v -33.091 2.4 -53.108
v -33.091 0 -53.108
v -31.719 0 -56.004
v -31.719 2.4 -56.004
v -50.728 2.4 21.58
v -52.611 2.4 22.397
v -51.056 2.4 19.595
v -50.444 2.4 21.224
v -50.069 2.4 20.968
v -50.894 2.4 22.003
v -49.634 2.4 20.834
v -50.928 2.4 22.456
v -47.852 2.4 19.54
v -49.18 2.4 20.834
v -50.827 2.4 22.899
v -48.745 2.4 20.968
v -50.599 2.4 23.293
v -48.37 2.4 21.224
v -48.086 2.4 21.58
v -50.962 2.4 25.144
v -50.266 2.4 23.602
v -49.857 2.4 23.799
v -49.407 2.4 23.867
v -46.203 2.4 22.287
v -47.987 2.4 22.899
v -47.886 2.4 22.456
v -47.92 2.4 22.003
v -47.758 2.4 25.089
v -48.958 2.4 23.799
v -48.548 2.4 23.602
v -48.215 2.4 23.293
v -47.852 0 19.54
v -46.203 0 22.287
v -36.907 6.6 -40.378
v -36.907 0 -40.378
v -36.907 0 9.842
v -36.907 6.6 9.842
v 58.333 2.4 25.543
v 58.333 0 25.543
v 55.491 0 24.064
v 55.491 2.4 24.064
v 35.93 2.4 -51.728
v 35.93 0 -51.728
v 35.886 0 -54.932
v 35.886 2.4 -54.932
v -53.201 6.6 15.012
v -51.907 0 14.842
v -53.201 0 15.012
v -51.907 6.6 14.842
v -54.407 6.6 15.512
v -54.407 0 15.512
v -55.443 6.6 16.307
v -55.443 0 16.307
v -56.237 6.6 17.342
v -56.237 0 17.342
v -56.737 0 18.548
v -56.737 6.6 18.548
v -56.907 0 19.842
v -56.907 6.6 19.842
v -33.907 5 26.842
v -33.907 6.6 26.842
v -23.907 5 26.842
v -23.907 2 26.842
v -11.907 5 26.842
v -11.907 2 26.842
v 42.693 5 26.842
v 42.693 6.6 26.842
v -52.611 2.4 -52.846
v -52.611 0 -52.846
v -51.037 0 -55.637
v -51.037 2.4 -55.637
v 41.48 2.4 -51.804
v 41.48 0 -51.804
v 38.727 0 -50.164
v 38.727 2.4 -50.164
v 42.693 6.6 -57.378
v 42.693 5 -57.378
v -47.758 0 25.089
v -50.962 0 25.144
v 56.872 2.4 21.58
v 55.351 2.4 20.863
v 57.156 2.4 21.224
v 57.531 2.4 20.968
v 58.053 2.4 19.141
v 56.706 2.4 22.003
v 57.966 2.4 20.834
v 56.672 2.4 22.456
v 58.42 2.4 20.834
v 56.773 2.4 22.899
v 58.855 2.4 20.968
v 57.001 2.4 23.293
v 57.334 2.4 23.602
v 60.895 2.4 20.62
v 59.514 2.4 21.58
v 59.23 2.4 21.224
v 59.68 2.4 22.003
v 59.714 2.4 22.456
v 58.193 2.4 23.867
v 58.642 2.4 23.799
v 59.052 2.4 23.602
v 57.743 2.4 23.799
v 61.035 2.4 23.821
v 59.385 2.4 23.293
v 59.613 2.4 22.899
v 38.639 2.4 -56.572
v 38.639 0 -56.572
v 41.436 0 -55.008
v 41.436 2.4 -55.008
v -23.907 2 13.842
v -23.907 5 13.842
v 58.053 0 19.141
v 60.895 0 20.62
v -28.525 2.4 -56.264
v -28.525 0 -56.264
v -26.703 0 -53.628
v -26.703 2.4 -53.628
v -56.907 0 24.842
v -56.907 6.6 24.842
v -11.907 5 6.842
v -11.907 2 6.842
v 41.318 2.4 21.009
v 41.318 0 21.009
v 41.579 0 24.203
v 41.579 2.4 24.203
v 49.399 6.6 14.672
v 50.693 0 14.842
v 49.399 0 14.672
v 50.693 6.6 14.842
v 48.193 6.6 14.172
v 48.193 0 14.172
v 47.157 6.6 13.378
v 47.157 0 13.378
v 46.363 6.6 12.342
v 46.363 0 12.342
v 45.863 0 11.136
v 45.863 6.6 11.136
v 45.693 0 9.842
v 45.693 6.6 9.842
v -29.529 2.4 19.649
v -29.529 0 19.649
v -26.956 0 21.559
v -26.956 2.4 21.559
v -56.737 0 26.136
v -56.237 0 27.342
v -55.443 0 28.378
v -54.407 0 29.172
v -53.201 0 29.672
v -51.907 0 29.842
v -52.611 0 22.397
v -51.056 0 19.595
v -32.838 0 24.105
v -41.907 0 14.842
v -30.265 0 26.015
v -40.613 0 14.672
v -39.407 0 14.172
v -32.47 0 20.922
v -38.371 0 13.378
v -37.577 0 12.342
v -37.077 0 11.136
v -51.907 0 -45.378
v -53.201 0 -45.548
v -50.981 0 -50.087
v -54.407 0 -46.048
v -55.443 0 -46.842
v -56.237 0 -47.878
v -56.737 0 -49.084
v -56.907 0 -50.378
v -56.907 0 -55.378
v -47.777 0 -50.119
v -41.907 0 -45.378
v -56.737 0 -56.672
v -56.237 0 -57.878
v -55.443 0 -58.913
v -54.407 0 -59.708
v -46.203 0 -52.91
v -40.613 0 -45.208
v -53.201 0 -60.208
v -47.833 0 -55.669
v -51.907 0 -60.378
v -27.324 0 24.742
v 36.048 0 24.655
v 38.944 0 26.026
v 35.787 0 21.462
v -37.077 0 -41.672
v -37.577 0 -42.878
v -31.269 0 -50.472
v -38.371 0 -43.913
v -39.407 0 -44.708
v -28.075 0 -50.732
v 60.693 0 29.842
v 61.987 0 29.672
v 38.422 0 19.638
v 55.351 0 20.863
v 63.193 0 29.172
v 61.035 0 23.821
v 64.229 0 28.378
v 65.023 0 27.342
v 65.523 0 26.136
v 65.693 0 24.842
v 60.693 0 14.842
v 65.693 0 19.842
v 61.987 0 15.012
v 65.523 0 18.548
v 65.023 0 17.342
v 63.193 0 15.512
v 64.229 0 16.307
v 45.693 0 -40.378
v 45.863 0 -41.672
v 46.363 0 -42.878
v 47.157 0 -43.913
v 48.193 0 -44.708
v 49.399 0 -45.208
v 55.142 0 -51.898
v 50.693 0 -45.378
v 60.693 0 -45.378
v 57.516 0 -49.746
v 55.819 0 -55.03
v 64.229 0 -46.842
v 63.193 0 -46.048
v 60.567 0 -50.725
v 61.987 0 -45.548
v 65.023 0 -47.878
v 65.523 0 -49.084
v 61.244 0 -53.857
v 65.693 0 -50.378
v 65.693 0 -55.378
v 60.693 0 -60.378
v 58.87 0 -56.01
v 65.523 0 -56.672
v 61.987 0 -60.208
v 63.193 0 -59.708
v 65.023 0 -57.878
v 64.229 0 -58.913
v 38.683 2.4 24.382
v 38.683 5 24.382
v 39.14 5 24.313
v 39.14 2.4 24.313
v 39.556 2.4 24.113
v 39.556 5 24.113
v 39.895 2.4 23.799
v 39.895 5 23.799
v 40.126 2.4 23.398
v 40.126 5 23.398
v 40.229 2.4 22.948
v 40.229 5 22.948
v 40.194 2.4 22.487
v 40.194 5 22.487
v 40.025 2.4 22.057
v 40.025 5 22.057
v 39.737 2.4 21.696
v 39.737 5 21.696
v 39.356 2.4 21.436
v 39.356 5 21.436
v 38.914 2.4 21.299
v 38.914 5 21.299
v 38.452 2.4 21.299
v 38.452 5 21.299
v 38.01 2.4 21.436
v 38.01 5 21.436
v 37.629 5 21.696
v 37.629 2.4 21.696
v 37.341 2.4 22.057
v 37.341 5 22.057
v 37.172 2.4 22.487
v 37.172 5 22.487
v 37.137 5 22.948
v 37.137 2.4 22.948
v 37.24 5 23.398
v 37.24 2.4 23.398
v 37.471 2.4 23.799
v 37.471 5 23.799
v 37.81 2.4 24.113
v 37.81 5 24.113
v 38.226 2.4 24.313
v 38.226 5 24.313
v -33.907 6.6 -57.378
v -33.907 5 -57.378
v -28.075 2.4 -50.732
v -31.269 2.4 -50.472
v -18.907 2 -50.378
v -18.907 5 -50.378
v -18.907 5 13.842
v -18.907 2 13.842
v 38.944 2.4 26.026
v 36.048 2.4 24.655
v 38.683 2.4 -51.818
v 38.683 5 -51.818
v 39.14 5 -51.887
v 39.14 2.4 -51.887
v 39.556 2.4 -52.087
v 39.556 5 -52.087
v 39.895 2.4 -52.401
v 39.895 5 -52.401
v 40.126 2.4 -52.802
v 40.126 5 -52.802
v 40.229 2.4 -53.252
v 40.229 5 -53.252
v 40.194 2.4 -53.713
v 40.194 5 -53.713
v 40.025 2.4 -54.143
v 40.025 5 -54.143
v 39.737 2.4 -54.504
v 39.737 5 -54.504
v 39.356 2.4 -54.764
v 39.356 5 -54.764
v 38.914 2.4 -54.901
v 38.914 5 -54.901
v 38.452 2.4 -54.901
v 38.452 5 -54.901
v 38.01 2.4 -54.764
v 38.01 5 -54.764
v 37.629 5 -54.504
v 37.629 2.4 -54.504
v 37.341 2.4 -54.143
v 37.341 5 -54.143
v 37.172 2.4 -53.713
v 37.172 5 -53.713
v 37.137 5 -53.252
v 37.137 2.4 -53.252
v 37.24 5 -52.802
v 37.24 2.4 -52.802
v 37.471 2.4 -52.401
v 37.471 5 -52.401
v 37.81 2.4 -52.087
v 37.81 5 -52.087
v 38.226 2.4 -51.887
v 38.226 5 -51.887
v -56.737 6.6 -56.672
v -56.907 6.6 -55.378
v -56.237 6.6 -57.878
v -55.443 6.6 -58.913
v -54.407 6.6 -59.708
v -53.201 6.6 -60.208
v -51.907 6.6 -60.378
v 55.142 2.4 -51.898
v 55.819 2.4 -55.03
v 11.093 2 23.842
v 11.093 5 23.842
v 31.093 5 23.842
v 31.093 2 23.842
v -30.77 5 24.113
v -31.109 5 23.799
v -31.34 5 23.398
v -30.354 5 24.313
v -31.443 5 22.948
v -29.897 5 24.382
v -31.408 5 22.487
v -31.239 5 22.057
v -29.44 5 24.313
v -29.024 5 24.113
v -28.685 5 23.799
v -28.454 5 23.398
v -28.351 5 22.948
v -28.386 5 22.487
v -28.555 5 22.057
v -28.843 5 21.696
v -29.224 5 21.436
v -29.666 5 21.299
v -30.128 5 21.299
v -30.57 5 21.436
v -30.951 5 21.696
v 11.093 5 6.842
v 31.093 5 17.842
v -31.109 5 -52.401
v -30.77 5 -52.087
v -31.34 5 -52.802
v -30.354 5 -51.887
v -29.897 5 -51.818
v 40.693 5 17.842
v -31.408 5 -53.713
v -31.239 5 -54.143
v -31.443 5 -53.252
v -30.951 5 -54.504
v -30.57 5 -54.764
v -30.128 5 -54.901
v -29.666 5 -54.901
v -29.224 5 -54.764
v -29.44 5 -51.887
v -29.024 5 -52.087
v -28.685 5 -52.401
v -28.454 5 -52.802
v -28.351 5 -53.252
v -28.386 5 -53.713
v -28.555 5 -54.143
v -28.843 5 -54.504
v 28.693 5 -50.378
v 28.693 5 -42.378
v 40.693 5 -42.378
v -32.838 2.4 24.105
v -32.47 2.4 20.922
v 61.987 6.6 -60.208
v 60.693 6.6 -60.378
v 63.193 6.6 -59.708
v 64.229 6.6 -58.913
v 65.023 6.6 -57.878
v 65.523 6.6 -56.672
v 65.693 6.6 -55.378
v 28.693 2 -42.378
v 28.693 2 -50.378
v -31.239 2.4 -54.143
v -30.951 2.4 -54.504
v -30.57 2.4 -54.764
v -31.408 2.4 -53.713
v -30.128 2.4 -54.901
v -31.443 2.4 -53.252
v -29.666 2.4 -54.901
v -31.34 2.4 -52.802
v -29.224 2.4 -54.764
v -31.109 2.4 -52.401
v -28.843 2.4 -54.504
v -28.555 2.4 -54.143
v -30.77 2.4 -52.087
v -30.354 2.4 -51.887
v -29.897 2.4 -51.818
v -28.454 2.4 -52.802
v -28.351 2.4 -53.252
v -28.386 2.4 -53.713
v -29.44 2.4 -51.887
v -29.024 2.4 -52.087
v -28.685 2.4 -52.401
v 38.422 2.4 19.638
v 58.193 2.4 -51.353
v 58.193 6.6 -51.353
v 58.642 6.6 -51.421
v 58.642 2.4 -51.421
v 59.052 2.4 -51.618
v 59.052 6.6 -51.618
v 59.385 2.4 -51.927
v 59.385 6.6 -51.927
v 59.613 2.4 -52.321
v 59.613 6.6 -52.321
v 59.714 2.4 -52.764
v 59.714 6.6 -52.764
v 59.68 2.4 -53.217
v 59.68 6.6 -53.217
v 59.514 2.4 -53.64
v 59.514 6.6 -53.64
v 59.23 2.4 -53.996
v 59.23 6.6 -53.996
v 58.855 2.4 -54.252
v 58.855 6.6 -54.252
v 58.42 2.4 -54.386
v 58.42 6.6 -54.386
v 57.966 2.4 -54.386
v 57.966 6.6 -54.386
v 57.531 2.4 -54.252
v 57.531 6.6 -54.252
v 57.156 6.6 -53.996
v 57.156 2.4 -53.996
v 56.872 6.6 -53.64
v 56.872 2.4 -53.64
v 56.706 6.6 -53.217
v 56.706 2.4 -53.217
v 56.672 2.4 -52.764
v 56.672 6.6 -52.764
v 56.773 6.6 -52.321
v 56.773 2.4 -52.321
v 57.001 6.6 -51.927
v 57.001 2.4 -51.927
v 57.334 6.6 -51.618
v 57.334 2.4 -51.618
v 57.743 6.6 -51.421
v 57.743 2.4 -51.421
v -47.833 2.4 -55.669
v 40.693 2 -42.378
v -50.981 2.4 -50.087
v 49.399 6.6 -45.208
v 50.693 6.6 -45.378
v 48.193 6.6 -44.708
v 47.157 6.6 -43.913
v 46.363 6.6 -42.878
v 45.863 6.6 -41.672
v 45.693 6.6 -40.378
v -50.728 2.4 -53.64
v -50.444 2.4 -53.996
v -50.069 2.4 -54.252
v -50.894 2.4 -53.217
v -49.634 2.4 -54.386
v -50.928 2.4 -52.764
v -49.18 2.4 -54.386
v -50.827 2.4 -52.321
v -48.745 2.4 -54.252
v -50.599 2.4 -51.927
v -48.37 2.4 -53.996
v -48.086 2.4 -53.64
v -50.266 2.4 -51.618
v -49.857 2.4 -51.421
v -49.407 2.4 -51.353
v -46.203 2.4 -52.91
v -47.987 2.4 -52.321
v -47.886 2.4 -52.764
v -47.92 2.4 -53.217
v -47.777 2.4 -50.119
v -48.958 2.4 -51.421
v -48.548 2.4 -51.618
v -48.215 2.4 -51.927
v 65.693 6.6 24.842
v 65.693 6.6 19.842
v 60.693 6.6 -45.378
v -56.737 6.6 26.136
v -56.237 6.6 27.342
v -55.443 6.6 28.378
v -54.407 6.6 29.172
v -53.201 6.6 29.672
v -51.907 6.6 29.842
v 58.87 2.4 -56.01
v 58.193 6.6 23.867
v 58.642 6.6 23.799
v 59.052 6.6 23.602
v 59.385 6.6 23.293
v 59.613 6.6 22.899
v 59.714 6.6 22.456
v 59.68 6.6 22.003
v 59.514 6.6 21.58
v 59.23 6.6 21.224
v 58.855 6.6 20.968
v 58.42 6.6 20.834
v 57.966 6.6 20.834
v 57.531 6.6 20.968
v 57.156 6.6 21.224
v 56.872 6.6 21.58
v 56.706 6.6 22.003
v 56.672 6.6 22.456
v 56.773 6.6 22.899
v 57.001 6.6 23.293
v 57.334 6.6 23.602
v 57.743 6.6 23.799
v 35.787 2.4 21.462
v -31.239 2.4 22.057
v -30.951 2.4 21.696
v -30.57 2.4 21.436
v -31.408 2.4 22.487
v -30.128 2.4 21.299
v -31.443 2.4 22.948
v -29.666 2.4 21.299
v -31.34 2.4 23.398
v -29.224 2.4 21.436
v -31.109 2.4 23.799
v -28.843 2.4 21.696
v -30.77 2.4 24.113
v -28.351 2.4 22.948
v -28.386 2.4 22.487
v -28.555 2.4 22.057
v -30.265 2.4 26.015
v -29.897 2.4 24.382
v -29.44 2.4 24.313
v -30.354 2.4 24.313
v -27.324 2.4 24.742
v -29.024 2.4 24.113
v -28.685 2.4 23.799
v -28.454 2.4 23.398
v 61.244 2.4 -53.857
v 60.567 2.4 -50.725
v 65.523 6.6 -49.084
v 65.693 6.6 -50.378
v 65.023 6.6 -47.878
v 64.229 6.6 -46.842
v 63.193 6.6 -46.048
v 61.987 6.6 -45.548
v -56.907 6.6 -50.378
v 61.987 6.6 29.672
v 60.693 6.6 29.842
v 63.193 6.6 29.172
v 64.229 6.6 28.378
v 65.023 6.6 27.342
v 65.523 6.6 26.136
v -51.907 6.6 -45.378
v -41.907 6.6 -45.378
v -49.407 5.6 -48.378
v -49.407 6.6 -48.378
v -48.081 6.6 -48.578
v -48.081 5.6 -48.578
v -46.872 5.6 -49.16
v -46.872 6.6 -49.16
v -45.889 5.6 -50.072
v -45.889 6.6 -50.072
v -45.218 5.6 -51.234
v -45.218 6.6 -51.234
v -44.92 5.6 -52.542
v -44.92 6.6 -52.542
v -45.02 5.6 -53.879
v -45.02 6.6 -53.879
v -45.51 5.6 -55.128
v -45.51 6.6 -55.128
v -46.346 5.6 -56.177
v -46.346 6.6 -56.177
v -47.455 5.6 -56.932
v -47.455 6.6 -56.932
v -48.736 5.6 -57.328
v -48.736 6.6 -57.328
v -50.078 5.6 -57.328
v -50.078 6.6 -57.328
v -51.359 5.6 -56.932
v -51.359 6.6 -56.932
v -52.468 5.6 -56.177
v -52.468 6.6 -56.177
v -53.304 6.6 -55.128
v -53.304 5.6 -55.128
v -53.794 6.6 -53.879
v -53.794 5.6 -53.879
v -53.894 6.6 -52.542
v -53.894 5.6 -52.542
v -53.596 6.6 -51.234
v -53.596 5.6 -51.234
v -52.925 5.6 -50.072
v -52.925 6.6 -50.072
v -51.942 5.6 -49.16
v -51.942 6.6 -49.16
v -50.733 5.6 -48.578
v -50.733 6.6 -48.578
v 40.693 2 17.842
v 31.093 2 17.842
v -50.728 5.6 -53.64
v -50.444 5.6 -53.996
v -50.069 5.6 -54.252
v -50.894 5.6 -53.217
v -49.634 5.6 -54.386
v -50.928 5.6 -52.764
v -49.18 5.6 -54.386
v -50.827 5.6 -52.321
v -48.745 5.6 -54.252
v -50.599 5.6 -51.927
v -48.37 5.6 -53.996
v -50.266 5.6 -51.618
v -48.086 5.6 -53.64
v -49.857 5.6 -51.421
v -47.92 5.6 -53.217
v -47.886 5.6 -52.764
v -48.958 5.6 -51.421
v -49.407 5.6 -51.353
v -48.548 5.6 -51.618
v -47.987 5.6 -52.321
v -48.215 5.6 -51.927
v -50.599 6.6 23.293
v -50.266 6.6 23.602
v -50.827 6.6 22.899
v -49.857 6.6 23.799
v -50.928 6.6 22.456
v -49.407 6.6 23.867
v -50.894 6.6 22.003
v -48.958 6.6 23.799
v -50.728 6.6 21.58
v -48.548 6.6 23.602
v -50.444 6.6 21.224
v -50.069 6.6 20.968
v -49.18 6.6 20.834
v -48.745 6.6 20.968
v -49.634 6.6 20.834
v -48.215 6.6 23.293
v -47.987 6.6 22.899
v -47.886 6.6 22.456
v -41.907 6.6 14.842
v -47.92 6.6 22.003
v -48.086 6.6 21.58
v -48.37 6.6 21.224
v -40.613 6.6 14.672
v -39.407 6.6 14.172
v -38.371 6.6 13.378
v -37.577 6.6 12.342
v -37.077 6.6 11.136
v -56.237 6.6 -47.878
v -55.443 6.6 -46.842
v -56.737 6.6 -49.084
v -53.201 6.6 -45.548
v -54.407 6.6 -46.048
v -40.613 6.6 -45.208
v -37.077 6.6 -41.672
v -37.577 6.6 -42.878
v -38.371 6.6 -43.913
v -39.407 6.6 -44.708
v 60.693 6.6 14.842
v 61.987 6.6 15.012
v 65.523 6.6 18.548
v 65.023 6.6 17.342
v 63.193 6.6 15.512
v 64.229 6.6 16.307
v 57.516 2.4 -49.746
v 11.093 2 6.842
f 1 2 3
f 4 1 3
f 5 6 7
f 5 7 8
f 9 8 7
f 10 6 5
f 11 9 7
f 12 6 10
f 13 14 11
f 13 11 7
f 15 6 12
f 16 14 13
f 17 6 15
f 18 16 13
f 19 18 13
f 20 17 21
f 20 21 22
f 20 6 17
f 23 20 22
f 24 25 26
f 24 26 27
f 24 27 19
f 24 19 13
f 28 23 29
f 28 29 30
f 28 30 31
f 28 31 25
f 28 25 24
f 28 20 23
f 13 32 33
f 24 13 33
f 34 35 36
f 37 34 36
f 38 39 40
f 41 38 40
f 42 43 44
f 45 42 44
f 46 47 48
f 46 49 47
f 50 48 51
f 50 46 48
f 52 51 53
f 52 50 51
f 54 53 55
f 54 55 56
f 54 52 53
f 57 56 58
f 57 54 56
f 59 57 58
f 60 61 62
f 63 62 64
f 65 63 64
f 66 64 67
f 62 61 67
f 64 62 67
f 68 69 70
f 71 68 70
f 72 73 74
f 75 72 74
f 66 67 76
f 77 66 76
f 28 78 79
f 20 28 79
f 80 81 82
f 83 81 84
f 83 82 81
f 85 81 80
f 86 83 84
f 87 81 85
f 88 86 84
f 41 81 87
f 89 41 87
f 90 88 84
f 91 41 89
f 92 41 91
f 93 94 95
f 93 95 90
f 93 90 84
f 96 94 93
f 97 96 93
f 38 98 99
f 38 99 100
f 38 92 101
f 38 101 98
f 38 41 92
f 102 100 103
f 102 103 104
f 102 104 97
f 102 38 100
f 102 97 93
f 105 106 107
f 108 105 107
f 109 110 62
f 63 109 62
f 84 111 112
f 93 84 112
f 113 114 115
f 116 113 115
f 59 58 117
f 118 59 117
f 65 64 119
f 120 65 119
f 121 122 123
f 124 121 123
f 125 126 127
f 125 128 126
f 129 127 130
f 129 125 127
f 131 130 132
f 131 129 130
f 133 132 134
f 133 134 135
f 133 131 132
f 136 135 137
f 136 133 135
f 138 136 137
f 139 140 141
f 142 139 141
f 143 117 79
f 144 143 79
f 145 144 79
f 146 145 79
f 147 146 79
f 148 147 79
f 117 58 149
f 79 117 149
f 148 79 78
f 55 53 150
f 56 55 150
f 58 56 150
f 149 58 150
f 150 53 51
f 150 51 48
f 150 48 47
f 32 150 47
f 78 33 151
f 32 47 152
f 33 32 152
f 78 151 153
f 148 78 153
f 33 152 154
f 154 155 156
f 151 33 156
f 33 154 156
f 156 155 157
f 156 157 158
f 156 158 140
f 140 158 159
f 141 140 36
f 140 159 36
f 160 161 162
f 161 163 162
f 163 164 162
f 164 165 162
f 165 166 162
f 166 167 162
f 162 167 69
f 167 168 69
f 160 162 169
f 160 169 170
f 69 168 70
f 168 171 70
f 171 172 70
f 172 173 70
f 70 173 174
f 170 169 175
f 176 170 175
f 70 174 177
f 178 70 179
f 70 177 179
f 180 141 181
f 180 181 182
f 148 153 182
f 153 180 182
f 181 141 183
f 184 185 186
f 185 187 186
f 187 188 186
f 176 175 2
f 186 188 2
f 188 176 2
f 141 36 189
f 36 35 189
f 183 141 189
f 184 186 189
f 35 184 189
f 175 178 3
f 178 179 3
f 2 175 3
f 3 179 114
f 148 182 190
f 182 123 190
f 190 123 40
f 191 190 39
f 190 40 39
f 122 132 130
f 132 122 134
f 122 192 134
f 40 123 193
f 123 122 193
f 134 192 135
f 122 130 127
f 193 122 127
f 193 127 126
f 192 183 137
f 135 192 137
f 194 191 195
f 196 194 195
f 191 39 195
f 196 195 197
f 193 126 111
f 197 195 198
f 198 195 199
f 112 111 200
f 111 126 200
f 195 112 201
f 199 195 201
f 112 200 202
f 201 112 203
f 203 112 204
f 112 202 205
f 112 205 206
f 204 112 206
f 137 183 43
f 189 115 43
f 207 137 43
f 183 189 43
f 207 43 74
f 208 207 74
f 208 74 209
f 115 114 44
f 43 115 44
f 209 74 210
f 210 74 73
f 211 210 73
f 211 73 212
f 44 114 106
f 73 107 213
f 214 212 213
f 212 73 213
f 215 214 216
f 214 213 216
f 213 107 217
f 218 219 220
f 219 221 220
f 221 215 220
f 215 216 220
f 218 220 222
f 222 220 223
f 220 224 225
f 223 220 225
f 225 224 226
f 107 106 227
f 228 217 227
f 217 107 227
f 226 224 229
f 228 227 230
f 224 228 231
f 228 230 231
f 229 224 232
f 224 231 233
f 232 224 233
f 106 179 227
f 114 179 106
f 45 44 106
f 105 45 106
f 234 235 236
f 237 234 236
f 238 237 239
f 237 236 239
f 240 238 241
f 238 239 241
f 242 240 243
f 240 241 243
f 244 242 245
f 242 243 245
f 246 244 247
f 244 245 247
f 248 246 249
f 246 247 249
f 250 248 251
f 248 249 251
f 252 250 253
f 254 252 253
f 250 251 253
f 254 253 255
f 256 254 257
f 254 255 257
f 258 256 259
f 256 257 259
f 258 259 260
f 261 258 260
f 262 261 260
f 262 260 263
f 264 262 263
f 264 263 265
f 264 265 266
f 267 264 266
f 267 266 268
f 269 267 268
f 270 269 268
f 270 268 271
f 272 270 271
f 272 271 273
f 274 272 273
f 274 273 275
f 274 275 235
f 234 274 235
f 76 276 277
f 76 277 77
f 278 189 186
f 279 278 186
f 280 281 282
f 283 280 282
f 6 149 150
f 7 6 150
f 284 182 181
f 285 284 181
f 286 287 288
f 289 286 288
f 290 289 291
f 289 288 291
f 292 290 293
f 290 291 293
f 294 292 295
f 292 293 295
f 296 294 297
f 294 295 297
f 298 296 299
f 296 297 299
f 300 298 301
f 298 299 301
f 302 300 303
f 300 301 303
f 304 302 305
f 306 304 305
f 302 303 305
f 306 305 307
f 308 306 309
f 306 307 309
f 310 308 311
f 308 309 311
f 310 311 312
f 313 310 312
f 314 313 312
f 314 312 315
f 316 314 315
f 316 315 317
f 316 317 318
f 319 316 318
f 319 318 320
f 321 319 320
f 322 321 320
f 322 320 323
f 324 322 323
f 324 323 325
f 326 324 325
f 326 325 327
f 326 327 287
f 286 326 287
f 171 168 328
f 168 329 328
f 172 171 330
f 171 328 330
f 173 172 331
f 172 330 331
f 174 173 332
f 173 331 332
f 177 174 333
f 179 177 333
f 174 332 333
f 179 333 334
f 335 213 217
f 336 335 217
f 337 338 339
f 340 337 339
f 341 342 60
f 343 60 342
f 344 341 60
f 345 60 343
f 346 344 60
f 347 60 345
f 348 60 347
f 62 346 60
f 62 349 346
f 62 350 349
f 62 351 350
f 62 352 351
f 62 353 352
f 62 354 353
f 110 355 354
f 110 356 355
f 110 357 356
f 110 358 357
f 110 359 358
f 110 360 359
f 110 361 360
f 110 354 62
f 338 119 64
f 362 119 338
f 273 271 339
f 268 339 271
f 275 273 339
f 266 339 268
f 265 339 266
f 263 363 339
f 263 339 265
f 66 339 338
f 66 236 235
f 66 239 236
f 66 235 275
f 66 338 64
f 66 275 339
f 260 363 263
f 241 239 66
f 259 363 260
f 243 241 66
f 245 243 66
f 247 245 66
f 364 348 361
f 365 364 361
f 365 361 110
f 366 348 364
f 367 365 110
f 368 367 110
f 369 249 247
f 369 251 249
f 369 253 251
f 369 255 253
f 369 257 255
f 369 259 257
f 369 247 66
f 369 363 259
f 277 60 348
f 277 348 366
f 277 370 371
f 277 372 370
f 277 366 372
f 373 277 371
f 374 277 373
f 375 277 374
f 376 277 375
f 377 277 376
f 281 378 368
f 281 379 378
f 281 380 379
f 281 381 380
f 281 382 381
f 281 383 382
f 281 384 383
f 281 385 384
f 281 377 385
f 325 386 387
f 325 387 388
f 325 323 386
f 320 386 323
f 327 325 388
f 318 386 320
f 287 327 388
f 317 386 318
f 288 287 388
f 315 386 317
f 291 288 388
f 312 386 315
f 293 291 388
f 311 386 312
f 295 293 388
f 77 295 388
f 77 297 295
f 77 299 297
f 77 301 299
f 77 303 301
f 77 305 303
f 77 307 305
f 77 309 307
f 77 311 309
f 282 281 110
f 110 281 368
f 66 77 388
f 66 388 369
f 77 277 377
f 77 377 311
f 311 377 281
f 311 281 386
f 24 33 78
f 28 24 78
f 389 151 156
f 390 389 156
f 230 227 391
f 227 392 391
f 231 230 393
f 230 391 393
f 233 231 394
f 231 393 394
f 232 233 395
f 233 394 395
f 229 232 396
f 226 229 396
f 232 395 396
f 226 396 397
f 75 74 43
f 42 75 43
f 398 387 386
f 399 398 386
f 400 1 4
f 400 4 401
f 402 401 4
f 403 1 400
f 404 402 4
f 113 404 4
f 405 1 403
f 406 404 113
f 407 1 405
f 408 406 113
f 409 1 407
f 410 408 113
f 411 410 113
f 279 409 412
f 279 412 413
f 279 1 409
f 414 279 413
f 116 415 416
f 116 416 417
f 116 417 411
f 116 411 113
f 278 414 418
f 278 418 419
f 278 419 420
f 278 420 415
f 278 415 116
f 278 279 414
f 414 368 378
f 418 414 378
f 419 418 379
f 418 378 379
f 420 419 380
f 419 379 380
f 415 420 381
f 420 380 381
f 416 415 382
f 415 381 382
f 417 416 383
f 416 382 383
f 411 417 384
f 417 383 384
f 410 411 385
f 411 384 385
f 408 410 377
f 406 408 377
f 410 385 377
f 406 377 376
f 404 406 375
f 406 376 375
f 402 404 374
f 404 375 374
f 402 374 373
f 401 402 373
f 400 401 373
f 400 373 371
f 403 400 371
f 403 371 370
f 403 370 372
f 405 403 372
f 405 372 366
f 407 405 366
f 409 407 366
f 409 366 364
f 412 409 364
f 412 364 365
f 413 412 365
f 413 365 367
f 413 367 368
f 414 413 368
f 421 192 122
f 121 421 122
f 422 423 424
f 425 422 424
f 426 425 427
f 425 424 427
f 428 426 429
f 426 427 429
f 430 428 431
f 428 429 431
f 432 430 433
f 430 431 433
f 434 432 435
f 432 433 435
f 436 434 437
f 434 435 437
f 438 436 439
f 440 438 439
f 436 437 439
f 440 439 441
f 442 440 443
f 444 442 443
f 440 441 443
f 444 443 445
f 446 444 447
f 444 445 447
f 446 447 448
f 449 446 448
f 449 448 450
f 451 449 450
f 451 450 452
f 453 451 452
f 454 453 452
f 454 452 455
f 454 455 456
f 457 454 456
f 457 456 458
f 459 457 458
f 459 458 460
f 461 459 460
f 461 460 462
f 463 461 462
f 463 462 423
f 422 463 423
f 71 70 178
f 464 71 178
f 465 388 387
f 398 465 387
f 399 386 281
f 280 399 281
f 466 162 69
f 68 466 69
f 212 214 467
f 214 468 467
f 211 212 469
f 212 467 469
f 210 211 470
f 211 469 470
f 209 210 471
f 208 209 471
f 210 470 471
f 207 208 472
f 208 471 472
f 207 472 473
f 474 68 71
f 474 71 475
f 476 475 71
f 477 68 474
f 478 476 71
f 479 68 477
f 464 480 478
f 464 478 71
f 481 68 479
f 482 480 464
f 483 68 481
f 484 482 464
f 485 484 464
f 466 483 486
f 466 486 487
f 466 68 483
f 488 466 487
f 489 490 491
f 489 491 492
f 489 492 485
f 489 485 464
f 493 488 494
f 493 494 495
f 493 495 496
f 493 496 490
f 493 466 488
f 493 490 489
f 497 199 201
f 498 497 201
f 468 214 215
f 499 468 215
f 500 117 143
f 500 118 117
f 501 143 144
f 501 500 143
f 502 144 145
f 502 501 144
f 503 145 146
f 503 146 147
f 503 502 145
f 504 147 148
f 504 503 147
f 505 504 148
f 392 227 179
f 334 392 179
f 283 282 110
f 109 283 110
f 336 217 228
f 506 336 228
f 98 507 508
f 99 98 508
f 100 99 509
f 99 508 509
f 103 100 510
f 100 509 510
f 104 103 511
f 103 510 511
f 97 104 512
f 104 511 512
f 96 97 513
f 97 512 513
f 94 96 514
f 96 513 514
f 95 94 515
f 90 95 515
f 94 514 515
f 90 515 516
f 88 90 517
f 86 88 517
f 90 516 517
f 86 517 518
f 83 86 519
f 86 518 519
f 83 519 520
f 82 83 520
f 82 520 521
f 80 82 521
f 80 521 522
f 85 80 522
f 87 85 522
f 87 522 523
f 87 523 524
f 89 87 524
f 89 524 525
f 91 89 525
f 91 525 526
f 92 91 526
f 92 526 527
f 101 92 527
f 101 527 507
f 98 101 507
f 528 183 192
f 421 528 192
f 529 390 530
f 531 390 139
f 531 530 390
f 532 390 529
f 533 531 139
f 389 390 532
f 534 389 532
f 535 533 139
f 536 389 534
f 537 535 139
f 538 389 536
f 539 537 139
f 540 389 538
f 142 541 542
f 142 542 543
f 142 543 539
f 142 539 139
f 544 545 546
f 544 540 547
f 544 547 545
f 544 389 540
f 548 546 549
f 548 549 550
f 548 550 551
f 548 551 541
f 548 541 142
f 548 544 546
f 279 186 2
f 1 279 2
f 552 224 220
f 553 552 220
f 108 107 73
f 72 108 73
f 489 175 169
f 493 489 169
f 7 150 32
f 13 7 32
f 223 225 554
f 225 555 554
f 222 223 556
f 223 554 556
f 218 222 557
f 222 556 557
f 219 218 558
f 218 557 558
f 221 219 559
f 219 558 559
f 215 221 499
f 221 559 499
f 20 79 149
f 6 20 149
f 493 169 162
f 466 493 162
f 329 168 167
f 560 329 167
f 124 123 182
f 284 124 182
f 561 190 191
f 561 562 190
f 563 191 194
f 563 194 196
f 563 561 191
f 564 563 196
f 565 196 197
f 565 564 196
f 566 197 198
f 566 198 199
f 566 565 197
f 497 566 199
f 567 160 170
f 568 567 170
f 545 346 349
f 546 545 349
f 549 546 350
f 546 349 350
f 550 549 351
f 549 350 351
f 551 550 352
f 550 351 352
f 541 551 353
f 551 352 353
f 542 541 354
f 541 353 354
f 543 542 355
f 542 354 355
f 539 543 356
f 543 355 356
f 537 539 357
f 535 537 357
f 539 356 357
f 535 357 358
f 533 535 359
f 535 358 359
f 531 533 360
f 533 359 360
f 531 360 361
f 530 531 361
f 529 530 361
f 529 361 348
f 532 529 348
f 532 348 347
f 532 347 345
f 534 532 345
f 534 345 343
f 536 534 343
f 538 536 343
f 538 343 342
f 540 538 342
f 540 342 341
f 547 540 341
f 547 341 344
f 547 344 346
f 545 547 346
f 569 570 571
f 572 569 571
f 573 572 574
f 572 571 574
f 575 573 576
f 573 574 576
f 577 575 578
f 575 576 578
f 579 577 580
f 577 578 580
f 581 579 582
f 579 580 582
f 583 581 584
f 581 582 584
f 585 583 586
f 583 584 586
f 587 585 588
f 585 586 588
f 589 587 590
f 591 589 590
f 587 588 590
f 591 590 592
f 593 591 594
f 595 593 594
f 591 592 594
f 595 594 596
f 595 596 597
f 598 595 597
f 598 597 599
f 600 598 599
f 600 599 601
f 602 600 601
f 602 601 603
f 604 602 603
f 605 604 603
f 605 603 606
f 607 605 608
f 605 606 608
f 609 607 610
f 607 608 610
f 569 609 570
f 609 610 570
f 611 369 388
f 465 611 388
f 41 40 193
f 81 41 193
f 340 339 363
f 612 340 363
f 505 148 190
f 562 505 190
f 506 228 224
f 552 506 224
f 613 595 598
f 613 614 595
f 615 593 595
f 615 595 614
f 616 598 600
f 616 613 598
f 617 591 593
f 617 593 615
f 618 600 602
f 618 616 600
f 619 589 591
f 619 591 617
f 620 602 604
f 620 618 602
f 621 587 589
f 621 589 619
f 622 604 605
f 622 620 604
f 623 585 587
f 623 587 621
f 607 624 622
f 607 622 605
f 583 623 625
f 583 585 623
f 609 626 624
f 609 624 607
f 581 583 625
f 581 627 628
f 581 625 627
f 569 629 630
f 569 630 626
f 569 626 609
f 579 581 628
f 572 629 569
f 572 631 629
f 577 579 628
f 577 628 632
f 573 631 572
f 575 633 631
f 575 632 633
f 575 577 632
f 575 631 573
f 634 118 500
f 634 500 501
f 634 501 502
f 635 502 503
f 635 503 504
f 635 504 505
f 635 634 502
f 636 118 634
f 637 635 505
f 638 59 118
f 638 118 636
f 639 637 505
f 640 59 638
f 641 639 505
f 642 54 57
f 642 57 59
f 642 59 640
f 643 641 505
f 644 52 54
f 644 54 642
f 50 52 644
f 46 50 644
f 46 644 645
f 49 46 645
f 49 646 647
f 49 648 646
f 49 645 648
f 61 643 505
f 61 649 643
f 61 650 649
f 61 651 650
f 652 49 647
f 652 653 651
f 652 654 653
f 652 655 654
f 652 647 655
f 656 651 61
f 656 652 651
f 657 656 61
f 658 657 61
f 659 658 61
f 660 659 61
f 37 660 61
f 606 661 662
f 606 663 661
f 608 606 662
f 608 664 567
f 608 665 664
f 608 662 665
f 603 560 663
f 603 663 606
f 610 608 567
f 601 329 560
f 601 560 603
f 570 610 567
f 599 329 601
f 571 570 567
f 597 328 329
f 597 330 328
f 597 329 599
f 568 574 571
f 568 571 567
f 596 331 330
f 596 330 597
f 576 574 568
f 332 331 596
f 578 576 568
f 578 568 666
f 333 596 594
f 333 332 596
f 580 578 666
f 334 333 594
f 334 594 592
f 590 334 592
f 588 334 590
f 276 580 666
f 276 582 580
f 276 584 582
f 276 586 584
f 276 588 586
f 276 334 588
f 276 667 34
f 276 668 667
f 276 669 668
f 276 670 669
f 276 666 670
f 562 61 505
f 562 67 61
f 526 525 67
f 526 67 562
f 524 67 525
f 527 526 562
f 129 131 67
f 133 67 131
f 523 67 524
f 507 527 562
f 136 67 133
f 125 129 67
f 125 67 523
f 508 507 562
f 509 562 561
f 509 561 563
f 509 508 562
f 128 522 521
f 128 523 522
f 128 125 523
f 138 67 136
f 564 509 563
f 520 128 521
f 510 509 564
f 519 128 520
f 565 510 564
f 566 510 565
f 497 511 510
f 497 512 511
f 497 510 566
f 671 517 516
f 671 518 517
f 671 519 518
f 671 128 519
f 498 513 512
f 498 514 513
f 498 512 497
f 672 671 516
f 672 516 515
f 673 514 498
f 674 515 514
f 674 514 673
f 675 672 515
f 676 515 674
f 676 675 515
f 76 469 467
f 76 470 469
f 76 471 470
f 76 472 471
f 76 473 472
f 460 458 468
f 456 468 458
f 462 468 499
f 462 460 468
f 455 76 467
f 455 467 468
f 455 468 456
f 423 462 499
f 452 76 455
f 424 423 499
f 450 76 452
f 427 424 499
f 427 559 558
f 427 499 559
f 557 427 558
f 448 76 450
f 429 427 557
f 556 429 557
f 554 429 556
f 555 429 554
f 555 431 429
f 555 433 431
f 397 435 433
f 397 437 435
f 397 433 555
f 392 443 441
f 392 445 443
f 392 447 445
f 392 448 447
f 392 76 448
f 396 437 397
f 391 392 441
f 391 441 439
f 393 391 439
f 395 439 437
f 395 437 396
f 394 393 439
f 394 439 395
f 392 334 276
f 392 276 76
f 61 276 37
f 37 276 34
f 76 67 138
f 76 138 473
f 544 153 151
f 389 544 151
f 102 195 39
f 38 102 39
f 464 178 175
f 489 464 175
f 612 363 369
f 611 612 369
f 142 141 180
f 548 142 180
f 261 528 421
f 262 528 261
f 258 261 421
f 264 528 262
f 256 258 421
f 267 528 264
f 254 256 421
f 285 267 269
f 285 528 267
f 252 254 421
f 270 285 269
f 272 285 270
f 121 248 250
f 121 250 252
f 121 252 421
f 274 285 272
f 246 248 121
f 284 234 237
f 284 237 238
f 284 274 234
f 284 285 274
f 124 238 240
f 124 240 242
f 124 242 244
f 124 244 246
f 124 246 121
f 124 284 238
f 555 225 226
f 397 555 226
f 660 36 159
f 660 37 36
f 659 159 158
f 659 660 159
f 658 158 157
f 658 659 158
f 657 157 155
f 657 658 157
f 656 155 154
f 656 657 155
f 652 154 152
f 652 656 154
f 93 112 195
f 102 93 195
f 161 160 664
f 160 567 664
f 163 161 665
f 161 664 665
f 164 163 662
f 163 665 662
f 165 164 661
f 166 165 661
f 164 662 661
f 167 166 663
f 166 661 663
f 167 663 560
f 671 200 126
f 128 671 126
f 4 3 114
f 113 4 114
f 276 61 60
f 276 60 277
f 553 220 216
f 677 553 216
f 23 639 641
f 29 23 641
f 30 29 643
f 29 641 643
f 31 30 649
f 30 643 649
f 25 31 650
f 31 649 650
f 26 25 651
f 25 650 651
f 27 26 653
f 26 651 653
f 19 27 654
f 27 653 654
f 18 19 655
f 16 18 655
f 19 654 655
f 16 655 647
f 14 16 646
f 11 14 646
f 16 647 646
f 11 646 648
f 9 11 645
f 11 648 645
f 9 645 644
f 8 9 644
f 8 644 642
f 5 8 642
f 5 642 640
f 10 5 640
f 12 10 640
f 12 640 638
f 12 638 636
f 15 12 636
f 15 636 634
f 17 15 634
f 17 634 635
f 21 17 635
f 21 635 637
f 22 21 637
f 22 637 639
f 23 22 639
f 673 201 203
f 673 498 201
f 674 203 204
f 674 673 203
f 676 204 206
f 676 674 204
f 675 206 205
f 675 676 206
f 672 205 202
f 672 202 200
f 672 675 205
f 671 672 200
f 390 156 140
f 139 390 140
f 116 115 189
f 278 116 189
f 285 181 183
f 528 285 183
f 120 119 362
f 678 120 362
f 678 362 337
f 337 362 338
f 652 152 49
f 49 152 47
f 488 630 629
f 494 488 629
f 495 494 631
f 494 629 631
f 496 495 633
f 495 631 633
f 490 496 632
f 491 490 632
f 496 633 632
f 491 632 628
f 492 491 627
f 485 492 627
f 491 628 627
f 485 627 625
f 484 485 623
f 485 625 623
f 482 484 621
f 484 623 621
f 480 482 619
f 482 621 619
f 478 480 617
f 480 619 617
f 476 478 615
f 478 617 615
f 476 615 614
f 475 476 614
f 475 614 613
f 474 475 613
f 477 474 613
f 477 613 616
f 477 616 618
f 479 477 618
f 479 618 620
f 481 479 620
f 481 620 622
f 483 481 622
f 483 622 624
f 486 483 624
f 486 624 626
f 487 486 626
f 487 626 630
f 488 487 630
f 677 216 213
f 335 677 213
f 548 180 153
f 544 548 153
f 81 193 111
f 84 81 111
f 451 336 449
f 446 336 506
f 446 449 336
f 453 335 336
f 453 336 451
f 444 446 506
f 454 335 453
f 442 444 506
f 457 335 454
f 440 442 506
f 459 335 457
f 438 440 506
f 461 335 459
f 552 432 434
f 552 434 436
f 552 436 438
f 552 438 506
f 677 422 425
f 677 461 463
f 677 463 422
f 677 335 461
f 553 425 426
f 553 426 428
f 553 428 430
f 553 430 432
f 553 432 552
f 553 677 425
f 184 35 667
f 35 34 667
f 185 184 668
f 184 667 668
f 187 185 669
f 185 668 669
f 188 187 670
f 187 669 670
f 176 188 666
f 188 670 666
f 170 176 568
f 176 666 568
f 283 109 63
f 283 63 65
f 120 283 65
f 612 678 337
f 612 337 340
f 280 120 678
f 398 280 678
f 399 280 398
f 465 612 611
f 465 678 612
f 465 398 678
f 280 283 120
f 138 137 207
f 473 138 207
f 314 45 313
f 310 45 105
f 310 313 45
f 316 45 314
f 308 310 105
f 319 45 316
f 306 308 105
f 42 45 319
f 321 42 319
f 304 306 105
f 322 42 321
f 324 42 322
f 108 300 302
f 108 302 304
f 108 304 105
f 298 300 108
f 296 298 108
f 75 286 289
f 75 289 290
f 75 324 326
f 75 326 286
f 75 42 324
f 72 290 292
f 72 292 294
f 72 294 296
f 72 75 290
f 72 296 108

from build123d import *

# Parameters (mm, degrees)
BOSS_EXTRUDE1_DEPTH = 6.6
SKETCH2_5_W         = 76.6
SKETCH2_5_H         = 84.22
CUT_EXTRUDE9_DEPTH  = 1.6
CUT_EXTRUDE10_DEPTH = 3
SKETCH2_R           = 1.55
CUT_EXTRUDE3_DEPTH  = 90.468527235
FILLET1_R           = 5
SKETCH5_R           = 1.525
CUT_EXTRUDE4_DEPTH  = 10
SKETCH5_3_R         = 4.5
CUT_EXTRUDE5_DEPTH  = 1
CUT_EXTRUDE6_DEPTH  = 2.4


with BuildPart() as part:
    # Sketch1 → Boss-Extrude1 (new body)
    with BuildSketch(Plane(origin=(0, 0, 0), x_dir=(1, 0, 0), z_dir=(0, 1, 0))):
        Polygon((-36.907015775, 45.377886591), (-36.907015775, -14.842113409), (-56.907015775, -14.842113409), (-56.907015775, -29.842113409), (-44.307015775, -29.842113409), (45.692984225, -29.842113409), (65.692984225, -29.842113409), (65.692984225, -14.842113409), (45.692984225, -14.842113409), (45.692984225, 45.377886591), (65.692984225, 45.377886591), (65.692984225, 60.377886591), (45.692984225, 60.377886591), (-44.307015775, 60.377886591), (-56.907015775, 60.377886591), (-56.907015775, 45.377886591), align=None)
    extrude(amount=BOSS_EXTRUDE1_DEPTH)

    # Sketch2<5> → Cut-Extrude9 (cut)
    with BuildSketch(Plane(origin=(0, 6.6, 0), x_dir=(1, 0, 0), z_dir=(0, 1, 0))):
        with Locations((4.392984225, 15.267886591)):
            Rectangle(SKETCH2_5_W, SKETCH2_5_H)
    extrude(amount=-CUT_EXTRUDE9_DEPTH, mode=Mode.SUBTRACT)

    # Sketch11 → Cut-Extrude10 (cut)
    with BuildSketch(Plane(origin=(0, 5, 0), x_dir=(1, 0, 0), z_dir=(0, 1, 0))):
        Polygon((-18.907015775, 50.377886591), (-18.907015775, -13.842113409), (-23.907015775, -13.842113409), (-23.907015775, -26.842113409), (-11.907015775, -26.842113409), (-11.907015775, -6.842113409), (11.092984225, -6.842113409), (11.092984225, -23.842113409), (31.092984225, -23.842113409), (31.092984225, -17.842113409), (40.692984225, -17.842113409), (40.692984225, 42.377886591), (28.692984225, 42.377886591), (28.692984225, 50.377886591), align=None)
    extrude(amount=-CUT_EXTRUDE10_DEPTH, mode=Mode.SUBTRACT)

    # Sketch2 → Cut-Extrude3 (cut, through all)
    with BuildSketch(Plane(origin=(0, 6.6, 0), x_dir=(1, 0, 0), z_dir=(0, 1, 0))):
        with Locations((38.682984225, 53.367886591)):
            Circle(SKETCH2_R)
        with Locations((-29.897015775, 53.367886591)):
            Circle(SKETCH2_R)
        with Locations((-29.897015775, -22.832113409)):
            Circle(SKETCH2_R)
        with Locations((38.682984225, -22.832113409)):
            Circle(SKETCH2_R)
    extrude(amount=-CUT_EXTRUDE3_DEPTH, mode=Mode.SUBTRACT)

    # Fillet1
    fillet1_edges = [part.edges().sort_by_distance(p)[0] for p in [
        (-56.907015775, 3.3, -45.377886591),
        (-56.907015775, 3.3, -60.377886591),
        (-56.907015775, 3.3, 29.842113409),
        (65.692984225, 3.3, -60.377886591),
        (45.692984225, 3.3, -45.377886591),
        (65.692984225, 3.3, -45.377886591),
        (65.692984225, 3.3, 29.842113409),
        (-56.907015775, 3.3, 14.842113409),
        (65.692984225, 3.3, 14.842113409),
        (45.692984225, 3.3, 14.842113409),
        (-36.907015775, 3.3, 14.842113409),
        (-36.907015775, 3.3, -45.377886591),
    ]]
    fillet(fillet1_edges, radius=FILLET1_R)

    # Sketch5 → Cut-Extrude4 (cut)
    with BuildSketch(Plane(origin=(0, 6.6, 0), x_dir=(1, 0, 0), z_dir=(0, 1, 0))):
        with Locations((-49.407015775, 52.877886591)):
            Circle(SKETCH5_R)
        with Locations((-49.407015775, -22.342113409)):
            Circle(SKETCH5_R)
        with Locations((58.192984225, -22.342113409)):
            Circle(SKETCH5_R)
        with Locations((58.192984225, 52.877886591)):
            Circle(SKETCH5_R)
    extrude(amount=-CUT_EXTRUDE4_DEPTH, mode=Mode.SUBTRACT)

    # Sketch5<3> → Cut-Extrude5 (cut)
    with BuildSketch(Plane(origin=(0, 6.6, 0), x_dir=(1, 0, 0), z_dir=(0, 1, 0))):
        with Locations((-49.407015775, 52.877886591)):
            Circle(SKETCH5_3_R)
    extrude(amount=-CUT_EXTRUDE5_DEPTH, mode=Mode.SUBTRACT)

    # Sketch6 → Cut-Extrude6 (cut)
    with BuildSketch(Plane.XZ):
        Polygon((-52.610843031, 22.396802624), (-51.056291653, 19.594862223), (-47.852464396, 19.540173008), (-46.203188518, 22.287424193), (-47.757739897, 25.089364595), (-50.961567153, 25.14405381), align=None)
        Polygon((58.333022061, 25.543345891), (55.49065449, 24.064005973), (55.350616655, 20.862773491), (58.05294639, 19.140880927), (60.895313961, 20.620220845), (61.035351796, 23.821453327), align=None)
        Polygon((60.566668821, -50.725417907), (57.515733962, -49.745981088), (55.142049366, -51.898449773), (55.819299629, -55.030355276), (58.870234489, -56.009792094), (61.243919085, -53.85732341), align=None)
        Polygon((-52.611149193, -52.845807944), (-51.036863407, -55.636708205), (-47.832729989, -55.668786852), (-46.202882357, -52.909965238), (-47.777168142, -50.119064978), (-50.98130156, -50.086986331), align=None)
        Polygon((-26.956477298, 21.559033103), (-27.32422665, 24.742154278), (-30.264765127, 26.015234584), (-32.837554252, 24.105193715), (-32.469804899, 20.92207254), (-29.529266422, 19.648992234), align=None)
        Polygon((41.318077345, 21.008988549), (41.579403227, 24.202608562), (38.944310108, 26.025733421), (36.047891106, 24.655238268), (35.786565223, 21.461618256), (38.421658342, 19.638493396), align=None)
        Polygon((41.435867732, -55.007744024), (41.479584174, -51.803748257), (38.726700668, -50.163890825), (35.930100719, -51.728029158), (35.886384277, -54.932024925), (38.639267783, -56.571882358), align=None)
        Polygon((-26.703291591, -53.627936278), (-28.074944048, -50.732065159), (-31.268668231, -50.472015472), (-33.090739958, -53.107836904), (-31.719087502, -56.003708023), (-28.525363318, -56.26375771), align=None)
    extrude(amount=-CUT_EXTRUDE6_DEPTH, mode=Mode.SUBTRACT)


solid = part.part
